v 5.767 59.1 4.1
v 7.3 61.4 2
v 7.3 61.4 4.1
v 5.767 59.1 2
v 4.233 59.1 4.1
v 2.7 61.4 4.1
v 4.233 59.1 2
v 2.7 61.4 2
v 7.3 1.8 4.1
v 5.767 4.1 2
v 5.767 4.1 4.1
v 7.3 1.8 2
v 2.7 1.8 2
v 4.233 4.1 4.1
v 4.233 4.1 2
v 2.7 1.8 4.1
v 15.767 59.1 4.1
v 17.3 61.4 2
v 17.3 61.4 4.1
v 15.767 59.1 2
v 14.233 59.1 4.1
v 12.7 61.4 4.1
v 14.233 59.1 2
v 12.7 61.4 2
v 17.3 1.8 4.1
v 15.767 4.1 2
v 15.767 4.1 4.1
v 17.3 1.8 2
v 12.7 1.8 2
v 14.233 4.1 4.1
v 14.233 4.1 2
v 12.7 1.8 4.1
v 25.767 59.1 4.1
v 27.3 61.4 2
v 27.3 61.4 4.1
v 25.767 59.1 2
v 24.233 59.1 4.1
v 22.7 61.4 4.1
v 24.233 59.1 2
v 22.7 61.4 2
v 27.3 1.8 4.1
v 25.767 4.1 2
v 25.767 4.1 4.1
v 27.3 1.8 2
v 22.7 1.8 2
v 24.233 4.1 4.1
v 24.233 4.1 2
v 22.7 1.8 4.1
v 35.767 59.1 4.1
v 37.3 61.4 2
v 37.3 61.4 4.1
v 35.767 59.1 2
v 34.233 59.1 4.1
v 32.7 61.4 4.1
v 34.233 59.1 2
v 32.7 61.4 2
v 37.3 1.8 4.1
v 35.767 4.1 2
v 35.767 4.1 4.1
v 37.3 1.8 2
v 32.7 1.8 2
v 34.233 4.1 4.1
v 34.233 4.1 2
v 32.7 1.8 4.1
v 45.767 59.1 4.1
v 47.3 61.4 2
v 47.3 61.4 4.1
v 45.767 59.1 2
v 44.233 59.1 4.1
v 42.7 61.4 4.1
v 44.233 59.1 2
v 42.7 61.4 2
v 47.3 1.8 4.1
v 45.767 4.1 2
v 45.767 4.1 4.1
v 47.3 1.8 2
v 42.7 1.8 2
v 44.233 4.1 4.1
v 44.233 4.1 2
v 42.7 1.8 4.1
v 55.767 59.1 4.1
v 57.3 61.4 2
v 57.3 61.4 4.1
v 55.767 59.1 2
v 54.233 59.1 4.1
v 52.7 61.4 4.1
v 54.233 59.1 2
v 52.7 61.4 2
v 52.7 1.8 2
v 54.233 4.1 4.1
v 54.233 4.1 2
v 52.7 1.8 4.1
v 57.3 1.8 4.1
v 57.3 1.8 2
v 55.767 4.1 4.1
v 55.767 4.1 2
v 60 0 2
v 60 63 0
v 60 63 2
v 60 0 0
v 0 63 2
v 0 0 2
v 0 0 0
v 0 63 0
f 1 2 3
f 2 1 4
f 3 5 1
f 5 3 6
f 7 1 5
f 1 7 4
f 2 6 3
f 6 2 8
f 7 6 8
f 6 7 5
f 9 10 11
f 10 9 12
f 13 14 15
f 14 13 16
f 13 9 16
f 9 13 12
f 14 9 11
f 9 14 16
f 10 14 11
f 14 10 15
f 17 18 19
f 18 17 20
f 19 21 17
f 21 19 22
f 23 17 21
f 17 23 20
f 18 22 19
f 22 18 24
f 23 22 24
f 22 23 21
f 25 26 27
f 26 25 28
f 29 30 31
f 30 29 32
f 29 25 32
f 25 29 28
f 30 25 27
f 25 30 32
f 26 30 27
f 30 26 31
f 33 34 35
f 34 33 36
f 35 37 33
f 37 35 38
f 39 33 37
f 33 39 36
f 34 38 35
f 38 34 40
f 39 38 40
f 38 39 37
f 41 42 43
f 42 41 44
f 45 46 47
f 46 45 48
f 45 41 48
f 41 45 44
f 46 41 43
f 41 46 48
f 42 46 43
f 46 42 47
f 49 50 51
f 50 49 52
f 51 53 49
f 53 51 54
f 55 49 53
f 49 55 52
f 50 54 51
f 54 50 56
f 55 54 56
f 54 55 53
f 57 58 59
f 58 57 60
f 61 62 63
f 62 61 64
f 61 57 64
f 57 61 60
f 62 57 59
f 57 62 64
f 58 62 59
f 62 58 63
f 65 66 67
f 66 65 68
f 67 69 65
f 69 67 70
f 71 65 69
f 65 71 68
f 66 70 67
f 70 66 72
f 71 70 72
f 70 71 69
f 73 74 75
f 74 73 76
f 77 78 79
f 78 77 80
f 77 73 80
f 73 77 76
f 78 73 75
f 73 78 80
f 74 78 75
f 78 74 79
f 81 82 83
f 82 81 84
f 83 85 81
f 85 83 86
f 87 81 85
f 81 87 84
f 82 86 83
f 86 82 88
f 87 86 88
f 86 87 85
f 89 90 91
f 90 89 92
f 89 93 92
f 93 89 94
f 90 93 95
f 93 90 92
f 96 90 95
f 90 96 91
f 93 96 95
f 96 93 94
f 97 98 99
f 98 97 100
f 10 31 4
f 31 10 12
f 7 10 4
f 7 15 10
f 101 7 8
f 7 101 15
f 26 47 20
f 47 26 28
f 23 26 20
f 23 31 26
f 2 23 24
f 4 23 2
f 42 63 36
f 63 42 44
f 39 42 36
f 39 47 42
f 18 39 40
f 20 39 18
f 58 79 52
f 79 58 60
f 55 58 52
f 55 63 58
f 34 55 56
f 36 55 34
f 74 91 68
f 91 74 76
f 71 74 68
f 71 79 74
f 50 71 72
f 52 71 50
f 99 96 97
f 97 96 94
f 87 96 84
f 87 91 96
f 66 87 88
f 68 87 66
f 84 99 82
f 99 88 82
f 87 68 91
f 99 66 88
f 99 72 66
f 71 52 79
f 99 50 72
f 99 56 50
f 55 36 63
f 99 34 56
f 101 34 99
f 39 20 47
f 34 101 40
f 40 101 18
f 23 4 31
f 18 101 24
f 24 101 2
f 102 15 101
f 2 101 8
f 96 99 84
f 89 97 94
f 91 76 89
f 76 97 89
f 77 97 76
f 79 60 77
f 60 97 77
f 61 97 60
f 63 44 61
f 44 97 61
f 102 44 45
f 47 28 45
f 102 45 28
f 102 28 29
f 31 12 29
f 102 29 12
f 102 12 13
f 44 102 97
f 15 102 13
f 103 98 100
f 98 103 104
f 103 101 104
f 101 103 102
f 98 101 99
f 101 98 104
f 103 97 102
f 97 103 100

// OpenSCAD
// file: common.scad
inch_to_mm = 25.4;

margin=0.1;
bigscrew_attach_hole_diameter= 2.44;
bigscrew_diameter = 2.54;
bigscrew_head_diameter = 5;
bigscrew_head_height = 2.1;
// file: board_config.scad
rail_position=20;
rail_height=2.5;
rail_width=5;
mainboard_width=60;
mainboard_height=130;
mainboard_thickness=4;
mainboard_spacing=10;
deep_holes_spacing=10;
rails=4;


board_attacher_width=4;
board_attacher_height=55;
board_attacher_length=30;

side_panel_height = board_attacher_height + 2*mainboard_thickness;
side_panel_thickness=2;
side_panel_ticks=2;

front_panel_height = board_attacher_height + 2*mainboard_thickness;
front_panel_thickness=2;
front_panel_ticks=2;
front_panel_width = mainboard_height + 2*side_panel_thickness;
// file: dovetail.scad
module dovetail_shape(width, height, length) {
    translate([-width/2,0,0]) linear_extrude(height = length) {
        polygon([[0, 0], [width, 0], [width - width/3, height], [width/3, height]]);
    }
}

module rail(male=false, width, height, length, default_offset=0.2) {
    // male will reduce the width slightly
    offset = male ? default_offset : 0;
    
    translate([0,0,-height+offset]) rotate([90,0,0]) dovetail_shape(width-2*offset,height-offset,length);
}
// main file
include <dovetail.scad>
include <board_config.scad>
include <common.scad>

module side_panel(holes=false) {
    union() {
        cube([mainboard_width,side_panel_height,side_panel_thickness]);
        // rails h
        for (i=[1:mainboard_width/mainboard_spacing])
            union() {
                translate([i*mainboard_spacing-mainboard_spacing/2,side_panel_height-mainboard_thickness+margin,margin]) rotate([90,180,0]) rail(true, rail_width, rail_height, side_panel_thickness+side_panel_ticks);
                translate([i*mainboard_spacing-mainboard_spacing/2,mainboard_thickness+margin,margin]) rotate([90,180,180]) rail(true, rail_width, rail_height, side_panel_thickness+side_panel_ticks);
            }
        
    }
}

side_panel();
